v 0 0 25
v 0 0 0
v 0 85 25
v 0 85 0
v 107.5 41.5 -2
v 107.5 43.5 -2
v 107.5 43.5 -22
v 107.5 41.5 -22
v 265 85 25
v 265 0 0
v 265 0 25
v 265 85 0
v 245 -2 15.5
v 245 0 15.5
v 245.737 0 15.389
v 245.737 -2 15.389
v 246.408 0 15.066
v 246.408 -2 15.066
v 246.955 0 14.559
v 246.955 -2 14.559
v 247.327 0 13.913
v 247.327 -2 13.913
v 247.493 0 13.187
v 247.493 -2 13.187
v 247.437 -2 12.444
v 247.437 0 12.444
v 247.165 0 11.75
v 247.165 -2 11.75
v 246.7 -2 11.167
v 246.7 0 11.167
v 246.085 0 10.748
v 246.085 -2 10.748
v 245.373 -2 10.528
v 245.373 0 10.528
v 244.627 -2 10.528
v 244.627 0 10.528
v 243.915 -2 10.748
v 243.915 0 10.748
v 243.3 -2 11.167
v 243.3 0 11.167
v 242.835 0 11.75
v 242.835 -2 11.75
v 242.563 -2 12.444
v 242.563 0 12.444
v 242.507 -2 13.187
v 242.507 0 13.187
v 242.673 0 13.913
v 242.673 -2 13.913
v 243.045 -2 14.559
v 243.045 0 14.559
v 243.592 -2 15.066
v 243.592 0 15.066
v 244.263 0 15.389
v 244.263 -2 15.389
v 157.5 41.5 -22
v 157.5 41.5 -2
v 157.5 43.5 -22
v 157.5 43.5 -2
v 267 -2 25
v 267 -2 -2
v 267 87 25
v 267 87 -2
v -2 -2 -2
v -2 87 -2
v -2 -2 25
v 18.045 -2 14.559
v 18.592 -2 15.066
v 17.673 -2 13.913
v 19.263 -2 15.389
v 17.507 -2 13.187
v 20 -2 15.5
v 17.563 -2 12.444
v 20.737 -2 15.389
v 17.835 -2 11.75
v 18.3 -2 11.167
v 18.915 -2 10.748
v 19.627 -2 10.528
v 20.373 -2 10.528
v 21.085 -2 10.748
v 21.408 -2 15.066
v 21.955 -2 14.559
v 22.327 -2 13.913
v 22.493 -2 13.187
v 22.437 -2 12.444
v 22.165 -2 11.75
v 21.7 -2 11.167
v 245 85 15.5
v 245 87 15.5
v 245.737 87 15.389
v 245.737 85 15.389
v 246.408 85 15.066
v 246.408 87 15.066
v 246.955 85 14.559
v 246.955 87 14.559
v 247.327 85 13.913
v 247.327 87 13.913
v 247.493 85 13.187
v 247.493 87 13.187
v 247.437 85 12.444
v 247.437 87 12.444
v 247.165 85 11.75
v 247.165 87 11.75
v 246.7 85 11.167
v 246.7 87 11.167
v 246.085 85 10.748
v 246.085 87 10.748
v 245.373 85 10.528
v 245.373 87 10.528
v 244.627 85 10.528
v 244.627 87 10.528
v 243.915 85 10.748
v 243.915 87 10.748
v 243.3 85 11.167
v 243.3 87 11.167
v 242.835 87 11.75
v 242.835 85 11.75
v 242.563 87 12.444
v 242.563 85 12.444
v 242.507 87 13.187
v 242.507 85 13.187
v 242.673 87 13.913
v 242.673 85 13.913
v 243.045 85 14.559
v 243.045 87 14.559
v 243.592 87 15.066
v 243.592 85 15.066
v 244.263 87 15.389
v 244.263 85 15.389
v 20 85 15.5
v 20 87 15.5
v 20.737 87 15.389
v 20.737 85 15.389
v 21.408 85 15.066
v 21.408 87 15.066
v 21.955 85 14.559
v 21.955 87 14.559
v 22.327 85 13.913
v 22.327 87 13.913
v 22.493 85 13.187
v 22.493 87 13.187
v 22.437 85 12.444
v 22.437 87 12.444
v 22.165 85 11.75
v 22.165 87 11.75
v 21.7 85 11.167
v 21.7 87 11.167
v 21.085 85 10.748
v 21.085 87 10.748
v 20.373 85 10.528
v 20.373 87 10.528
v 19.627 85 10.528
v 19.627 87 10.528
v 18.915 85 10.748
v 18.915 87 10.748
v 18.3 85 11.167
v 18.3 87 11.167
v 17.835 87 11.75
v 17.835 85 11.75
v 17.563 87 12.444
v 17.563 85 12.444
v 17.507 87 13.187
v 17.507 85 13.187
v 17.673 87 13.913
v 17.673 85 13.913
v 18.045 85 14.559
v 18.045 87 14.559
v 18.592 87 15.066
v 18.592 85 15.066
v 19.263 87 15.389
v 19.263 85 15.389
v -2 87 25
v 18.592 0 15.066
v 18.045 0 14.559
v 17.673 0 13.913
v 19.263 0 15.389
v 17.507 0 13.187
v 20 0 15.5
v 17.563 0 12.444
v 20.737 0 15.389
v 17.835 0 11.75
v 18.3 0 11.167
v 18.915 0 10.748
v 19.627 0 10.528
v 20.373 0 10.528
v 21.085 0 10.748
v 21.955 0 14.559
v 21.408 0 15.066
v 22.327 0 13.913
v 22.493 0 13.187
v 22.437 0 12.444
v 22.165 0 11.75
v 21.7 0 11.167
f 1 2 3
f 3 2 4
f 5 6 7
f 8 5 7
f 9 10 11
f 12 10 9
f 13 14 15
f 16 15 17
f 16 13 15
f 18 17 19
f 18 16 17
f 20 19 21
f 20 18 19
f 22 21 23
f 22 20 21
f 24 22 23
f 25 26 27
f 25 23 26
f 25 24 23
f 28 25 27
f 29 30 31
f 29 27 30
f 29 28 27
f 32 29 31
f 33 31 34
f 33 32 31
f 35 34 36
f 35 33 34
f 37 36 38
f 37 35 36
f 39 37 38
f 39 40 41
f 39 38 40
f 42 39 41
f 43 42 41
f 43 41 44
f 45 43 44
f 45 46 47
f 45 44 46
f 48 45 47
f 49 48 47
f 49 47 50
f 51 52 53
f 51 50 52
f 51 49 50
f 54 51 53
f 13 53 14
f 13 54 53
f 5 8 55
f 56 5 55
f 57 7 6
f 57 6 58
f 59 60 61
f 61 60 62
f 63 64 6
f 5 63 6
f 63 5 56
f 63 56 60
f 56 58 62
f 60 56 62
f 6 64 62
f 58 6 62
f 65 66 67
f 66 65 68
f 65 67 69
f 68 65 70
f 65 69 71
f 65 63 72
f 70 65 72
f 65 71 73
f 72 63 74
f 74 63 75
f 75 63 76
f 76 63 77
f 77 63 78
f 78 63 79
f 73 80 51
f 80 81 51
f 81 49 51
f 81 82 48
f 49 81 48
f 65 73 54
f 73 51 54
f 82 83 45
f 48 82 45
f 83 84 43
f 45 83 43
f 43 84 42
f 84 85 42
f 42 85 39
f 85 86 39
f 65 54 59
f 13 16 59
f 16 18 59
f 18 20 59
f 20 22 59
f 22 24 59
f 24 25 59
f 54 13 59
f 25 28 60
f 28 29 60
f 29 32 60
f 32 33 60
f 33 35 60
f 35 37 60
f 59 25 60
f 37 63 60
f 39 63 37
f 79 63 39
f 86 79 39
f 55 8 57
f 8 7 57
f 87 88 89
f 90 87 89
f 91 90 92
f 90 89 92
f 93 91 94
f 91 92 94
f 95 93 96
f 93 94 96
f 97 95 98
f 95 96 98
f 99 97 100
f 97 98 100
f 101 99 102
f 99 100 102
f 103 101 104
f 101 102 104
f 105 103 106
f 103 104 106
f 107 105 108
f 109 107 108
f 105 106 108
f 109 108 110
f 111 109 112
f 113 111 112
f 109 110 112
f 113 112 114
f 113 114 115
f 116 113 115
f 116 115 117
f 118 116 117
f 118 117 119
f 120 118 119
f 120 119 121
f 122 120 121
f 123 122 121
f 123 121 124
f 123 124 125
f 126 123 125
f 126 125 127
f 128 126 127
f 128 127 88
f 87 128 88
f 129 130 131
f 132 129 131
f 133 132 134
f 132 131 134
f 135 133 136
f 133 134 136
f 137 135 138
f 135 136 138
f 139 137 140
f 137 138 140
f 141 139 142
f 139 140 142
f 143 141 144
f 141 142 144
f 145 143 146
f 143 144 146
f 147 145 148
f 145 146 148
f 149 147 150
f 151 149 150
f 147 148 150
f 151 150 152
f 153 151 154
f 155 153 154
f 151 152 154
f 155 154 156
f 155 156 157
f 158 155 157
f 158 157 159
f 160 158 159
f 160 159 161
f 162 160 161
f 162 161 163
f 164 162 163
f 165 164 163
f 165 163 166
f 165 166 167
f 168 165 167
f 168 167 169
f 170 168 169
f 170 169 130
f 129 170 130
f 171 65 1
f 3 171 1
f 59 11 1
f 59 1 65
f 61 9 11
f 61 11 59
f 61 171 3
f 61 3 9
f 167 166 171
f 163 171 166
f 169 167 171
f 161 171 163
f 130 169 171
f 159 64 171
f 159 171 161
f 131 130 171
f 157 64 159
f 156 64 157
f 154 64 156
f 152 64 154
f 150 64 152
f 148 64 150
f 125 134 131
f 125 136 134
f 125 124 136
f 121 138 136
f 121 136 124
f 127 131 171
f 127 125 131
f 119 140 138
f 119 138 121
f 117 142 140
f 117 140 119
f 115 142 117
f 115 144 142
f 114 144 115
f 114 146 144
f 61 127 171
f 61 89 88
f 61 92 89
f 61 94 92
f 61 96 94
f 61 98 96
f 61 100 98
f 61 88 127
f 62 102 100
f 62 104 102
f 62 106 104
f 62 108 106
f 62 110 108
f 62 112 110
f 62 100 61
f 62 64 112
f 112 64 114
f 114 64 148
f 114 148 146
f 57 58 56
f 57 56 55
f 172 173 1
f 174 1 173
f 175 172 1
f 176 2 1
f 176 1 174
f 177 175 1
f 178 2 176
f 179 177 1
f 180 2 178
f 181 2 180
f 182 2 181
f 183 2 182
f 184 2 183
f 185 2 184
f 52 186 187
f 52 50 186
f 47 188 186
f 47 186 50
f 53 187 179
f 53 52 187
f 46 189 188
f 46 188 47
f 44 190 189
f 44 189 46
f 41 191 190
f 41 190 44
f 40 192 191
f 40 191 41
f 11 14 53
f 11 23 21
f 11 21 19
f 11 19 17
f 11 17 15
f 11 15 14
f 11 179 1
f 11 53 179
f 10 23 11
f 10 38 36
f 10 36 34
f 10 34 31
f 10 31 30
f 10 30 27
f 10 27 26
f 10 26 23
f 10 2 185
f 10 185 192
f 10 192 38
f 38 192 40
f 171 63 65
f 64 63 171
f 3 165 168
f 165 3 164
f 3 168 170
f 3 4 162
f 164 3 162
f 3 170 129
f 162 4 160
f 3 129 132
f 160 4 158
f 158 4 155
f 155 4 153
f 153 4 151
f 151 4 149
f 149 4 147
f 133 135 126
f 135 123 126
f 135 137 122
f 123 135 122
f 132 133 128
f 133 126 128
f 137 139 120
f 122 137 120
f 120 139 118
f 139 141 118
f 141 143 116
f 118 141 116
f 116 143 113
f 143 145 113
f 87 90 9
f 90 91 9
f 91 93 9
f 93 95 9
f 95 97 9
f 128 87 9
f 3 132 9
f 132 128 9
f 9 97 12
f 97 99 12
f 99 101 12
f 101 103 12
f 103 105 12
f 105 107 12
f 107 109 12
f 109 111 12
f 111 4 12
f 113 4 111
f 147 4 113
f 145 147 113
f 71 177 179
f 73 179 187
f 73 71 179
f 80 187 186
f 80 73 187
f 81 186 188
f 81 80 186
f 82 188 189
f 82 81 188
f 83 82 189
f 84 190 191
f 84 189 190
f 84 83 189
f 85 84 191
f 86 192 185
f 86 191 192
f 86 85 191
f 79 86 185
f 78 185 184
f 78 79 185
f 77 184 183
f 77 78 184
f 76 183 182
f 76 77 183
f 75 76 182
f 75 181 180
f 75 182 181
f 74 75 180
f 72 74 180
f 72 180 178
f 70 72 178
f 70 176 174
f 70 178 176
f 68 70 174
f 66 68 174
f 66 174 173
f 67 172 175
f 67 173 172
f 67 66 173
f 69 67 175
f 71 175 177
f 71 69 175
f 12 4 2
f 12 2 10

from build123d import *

# Parameters (mm, degrees)
SKETCH1_W           = 265
SKETCH1_H           = 85
BOSS_EXTRUDE2_DEPTH = 25
SHELL1_T            = 2
SKETCH3_W           = 50
SKETCH3_H           = 20
BOSS_EXTRUDE3_DEPTH = 1
SKETCH5_R           = 2.5
CUT_EXTRUDE1_DEPTH  = 87


with BuildPart() as part:
    # Sketch1 → Boss-Extrude2 (new body)
    with BuildSketch(Plane.XY):
        with Locations((132.5, 42.5)):
            Rectangle(SKETCH1_W, SKETCH1_H)
    extrude(amount=BOSS_EXTRUDE2_DEPTH)

    # Shell1
    shell1_openings = [part.faces().sort_by_distance(p)[0] for p in [
        (132.5, 42.5, 25),
    ]]
    offset(amount=SHELL1_T, openings=shell1_openings, kind=Kind.INTERSECTION)

    # Sketch3 → Boss-Extrude3 (add, symmetric)
    with BuildSketch(Plane(origin=(0, 42.5, 0), x_dir=(1, 0, 0), z_dir=(0, 1, 0))):
        with Locations((132.5, 12)):
            Rectangle(SKETCH3_W, SKETCH3_H)
    extrude(amount=BOSS_EXTRUDE3_DEPTH, both=True)

    # Sketch5 → Cut-Extrude1 (cut)
    with BuildSketch(Plane(origin=(0, 87, 0), x_dir=(1, 0, 0), z_dir=(0, 1, 0))):
        with Locations(Location((245, -13, 0), (0, 0, 270))):
            Circle(SKETCH5_R)
        with Locations(Location((20, -13, 0), (0, 0, 270))):
            Circle(SKETCH5_R)
    cut_extrude1 = extrude(amount=-CUT_EXTRUDE1_DEPTH, mode=Mode.SUBTRACT)

    # Mirror1: Cut-Extrude1 across plane
    add(cut_extrude1.mirror(Plane.ZX.offset(42.5)), mode=Mode.SUBTRACT)


solid = part.part
